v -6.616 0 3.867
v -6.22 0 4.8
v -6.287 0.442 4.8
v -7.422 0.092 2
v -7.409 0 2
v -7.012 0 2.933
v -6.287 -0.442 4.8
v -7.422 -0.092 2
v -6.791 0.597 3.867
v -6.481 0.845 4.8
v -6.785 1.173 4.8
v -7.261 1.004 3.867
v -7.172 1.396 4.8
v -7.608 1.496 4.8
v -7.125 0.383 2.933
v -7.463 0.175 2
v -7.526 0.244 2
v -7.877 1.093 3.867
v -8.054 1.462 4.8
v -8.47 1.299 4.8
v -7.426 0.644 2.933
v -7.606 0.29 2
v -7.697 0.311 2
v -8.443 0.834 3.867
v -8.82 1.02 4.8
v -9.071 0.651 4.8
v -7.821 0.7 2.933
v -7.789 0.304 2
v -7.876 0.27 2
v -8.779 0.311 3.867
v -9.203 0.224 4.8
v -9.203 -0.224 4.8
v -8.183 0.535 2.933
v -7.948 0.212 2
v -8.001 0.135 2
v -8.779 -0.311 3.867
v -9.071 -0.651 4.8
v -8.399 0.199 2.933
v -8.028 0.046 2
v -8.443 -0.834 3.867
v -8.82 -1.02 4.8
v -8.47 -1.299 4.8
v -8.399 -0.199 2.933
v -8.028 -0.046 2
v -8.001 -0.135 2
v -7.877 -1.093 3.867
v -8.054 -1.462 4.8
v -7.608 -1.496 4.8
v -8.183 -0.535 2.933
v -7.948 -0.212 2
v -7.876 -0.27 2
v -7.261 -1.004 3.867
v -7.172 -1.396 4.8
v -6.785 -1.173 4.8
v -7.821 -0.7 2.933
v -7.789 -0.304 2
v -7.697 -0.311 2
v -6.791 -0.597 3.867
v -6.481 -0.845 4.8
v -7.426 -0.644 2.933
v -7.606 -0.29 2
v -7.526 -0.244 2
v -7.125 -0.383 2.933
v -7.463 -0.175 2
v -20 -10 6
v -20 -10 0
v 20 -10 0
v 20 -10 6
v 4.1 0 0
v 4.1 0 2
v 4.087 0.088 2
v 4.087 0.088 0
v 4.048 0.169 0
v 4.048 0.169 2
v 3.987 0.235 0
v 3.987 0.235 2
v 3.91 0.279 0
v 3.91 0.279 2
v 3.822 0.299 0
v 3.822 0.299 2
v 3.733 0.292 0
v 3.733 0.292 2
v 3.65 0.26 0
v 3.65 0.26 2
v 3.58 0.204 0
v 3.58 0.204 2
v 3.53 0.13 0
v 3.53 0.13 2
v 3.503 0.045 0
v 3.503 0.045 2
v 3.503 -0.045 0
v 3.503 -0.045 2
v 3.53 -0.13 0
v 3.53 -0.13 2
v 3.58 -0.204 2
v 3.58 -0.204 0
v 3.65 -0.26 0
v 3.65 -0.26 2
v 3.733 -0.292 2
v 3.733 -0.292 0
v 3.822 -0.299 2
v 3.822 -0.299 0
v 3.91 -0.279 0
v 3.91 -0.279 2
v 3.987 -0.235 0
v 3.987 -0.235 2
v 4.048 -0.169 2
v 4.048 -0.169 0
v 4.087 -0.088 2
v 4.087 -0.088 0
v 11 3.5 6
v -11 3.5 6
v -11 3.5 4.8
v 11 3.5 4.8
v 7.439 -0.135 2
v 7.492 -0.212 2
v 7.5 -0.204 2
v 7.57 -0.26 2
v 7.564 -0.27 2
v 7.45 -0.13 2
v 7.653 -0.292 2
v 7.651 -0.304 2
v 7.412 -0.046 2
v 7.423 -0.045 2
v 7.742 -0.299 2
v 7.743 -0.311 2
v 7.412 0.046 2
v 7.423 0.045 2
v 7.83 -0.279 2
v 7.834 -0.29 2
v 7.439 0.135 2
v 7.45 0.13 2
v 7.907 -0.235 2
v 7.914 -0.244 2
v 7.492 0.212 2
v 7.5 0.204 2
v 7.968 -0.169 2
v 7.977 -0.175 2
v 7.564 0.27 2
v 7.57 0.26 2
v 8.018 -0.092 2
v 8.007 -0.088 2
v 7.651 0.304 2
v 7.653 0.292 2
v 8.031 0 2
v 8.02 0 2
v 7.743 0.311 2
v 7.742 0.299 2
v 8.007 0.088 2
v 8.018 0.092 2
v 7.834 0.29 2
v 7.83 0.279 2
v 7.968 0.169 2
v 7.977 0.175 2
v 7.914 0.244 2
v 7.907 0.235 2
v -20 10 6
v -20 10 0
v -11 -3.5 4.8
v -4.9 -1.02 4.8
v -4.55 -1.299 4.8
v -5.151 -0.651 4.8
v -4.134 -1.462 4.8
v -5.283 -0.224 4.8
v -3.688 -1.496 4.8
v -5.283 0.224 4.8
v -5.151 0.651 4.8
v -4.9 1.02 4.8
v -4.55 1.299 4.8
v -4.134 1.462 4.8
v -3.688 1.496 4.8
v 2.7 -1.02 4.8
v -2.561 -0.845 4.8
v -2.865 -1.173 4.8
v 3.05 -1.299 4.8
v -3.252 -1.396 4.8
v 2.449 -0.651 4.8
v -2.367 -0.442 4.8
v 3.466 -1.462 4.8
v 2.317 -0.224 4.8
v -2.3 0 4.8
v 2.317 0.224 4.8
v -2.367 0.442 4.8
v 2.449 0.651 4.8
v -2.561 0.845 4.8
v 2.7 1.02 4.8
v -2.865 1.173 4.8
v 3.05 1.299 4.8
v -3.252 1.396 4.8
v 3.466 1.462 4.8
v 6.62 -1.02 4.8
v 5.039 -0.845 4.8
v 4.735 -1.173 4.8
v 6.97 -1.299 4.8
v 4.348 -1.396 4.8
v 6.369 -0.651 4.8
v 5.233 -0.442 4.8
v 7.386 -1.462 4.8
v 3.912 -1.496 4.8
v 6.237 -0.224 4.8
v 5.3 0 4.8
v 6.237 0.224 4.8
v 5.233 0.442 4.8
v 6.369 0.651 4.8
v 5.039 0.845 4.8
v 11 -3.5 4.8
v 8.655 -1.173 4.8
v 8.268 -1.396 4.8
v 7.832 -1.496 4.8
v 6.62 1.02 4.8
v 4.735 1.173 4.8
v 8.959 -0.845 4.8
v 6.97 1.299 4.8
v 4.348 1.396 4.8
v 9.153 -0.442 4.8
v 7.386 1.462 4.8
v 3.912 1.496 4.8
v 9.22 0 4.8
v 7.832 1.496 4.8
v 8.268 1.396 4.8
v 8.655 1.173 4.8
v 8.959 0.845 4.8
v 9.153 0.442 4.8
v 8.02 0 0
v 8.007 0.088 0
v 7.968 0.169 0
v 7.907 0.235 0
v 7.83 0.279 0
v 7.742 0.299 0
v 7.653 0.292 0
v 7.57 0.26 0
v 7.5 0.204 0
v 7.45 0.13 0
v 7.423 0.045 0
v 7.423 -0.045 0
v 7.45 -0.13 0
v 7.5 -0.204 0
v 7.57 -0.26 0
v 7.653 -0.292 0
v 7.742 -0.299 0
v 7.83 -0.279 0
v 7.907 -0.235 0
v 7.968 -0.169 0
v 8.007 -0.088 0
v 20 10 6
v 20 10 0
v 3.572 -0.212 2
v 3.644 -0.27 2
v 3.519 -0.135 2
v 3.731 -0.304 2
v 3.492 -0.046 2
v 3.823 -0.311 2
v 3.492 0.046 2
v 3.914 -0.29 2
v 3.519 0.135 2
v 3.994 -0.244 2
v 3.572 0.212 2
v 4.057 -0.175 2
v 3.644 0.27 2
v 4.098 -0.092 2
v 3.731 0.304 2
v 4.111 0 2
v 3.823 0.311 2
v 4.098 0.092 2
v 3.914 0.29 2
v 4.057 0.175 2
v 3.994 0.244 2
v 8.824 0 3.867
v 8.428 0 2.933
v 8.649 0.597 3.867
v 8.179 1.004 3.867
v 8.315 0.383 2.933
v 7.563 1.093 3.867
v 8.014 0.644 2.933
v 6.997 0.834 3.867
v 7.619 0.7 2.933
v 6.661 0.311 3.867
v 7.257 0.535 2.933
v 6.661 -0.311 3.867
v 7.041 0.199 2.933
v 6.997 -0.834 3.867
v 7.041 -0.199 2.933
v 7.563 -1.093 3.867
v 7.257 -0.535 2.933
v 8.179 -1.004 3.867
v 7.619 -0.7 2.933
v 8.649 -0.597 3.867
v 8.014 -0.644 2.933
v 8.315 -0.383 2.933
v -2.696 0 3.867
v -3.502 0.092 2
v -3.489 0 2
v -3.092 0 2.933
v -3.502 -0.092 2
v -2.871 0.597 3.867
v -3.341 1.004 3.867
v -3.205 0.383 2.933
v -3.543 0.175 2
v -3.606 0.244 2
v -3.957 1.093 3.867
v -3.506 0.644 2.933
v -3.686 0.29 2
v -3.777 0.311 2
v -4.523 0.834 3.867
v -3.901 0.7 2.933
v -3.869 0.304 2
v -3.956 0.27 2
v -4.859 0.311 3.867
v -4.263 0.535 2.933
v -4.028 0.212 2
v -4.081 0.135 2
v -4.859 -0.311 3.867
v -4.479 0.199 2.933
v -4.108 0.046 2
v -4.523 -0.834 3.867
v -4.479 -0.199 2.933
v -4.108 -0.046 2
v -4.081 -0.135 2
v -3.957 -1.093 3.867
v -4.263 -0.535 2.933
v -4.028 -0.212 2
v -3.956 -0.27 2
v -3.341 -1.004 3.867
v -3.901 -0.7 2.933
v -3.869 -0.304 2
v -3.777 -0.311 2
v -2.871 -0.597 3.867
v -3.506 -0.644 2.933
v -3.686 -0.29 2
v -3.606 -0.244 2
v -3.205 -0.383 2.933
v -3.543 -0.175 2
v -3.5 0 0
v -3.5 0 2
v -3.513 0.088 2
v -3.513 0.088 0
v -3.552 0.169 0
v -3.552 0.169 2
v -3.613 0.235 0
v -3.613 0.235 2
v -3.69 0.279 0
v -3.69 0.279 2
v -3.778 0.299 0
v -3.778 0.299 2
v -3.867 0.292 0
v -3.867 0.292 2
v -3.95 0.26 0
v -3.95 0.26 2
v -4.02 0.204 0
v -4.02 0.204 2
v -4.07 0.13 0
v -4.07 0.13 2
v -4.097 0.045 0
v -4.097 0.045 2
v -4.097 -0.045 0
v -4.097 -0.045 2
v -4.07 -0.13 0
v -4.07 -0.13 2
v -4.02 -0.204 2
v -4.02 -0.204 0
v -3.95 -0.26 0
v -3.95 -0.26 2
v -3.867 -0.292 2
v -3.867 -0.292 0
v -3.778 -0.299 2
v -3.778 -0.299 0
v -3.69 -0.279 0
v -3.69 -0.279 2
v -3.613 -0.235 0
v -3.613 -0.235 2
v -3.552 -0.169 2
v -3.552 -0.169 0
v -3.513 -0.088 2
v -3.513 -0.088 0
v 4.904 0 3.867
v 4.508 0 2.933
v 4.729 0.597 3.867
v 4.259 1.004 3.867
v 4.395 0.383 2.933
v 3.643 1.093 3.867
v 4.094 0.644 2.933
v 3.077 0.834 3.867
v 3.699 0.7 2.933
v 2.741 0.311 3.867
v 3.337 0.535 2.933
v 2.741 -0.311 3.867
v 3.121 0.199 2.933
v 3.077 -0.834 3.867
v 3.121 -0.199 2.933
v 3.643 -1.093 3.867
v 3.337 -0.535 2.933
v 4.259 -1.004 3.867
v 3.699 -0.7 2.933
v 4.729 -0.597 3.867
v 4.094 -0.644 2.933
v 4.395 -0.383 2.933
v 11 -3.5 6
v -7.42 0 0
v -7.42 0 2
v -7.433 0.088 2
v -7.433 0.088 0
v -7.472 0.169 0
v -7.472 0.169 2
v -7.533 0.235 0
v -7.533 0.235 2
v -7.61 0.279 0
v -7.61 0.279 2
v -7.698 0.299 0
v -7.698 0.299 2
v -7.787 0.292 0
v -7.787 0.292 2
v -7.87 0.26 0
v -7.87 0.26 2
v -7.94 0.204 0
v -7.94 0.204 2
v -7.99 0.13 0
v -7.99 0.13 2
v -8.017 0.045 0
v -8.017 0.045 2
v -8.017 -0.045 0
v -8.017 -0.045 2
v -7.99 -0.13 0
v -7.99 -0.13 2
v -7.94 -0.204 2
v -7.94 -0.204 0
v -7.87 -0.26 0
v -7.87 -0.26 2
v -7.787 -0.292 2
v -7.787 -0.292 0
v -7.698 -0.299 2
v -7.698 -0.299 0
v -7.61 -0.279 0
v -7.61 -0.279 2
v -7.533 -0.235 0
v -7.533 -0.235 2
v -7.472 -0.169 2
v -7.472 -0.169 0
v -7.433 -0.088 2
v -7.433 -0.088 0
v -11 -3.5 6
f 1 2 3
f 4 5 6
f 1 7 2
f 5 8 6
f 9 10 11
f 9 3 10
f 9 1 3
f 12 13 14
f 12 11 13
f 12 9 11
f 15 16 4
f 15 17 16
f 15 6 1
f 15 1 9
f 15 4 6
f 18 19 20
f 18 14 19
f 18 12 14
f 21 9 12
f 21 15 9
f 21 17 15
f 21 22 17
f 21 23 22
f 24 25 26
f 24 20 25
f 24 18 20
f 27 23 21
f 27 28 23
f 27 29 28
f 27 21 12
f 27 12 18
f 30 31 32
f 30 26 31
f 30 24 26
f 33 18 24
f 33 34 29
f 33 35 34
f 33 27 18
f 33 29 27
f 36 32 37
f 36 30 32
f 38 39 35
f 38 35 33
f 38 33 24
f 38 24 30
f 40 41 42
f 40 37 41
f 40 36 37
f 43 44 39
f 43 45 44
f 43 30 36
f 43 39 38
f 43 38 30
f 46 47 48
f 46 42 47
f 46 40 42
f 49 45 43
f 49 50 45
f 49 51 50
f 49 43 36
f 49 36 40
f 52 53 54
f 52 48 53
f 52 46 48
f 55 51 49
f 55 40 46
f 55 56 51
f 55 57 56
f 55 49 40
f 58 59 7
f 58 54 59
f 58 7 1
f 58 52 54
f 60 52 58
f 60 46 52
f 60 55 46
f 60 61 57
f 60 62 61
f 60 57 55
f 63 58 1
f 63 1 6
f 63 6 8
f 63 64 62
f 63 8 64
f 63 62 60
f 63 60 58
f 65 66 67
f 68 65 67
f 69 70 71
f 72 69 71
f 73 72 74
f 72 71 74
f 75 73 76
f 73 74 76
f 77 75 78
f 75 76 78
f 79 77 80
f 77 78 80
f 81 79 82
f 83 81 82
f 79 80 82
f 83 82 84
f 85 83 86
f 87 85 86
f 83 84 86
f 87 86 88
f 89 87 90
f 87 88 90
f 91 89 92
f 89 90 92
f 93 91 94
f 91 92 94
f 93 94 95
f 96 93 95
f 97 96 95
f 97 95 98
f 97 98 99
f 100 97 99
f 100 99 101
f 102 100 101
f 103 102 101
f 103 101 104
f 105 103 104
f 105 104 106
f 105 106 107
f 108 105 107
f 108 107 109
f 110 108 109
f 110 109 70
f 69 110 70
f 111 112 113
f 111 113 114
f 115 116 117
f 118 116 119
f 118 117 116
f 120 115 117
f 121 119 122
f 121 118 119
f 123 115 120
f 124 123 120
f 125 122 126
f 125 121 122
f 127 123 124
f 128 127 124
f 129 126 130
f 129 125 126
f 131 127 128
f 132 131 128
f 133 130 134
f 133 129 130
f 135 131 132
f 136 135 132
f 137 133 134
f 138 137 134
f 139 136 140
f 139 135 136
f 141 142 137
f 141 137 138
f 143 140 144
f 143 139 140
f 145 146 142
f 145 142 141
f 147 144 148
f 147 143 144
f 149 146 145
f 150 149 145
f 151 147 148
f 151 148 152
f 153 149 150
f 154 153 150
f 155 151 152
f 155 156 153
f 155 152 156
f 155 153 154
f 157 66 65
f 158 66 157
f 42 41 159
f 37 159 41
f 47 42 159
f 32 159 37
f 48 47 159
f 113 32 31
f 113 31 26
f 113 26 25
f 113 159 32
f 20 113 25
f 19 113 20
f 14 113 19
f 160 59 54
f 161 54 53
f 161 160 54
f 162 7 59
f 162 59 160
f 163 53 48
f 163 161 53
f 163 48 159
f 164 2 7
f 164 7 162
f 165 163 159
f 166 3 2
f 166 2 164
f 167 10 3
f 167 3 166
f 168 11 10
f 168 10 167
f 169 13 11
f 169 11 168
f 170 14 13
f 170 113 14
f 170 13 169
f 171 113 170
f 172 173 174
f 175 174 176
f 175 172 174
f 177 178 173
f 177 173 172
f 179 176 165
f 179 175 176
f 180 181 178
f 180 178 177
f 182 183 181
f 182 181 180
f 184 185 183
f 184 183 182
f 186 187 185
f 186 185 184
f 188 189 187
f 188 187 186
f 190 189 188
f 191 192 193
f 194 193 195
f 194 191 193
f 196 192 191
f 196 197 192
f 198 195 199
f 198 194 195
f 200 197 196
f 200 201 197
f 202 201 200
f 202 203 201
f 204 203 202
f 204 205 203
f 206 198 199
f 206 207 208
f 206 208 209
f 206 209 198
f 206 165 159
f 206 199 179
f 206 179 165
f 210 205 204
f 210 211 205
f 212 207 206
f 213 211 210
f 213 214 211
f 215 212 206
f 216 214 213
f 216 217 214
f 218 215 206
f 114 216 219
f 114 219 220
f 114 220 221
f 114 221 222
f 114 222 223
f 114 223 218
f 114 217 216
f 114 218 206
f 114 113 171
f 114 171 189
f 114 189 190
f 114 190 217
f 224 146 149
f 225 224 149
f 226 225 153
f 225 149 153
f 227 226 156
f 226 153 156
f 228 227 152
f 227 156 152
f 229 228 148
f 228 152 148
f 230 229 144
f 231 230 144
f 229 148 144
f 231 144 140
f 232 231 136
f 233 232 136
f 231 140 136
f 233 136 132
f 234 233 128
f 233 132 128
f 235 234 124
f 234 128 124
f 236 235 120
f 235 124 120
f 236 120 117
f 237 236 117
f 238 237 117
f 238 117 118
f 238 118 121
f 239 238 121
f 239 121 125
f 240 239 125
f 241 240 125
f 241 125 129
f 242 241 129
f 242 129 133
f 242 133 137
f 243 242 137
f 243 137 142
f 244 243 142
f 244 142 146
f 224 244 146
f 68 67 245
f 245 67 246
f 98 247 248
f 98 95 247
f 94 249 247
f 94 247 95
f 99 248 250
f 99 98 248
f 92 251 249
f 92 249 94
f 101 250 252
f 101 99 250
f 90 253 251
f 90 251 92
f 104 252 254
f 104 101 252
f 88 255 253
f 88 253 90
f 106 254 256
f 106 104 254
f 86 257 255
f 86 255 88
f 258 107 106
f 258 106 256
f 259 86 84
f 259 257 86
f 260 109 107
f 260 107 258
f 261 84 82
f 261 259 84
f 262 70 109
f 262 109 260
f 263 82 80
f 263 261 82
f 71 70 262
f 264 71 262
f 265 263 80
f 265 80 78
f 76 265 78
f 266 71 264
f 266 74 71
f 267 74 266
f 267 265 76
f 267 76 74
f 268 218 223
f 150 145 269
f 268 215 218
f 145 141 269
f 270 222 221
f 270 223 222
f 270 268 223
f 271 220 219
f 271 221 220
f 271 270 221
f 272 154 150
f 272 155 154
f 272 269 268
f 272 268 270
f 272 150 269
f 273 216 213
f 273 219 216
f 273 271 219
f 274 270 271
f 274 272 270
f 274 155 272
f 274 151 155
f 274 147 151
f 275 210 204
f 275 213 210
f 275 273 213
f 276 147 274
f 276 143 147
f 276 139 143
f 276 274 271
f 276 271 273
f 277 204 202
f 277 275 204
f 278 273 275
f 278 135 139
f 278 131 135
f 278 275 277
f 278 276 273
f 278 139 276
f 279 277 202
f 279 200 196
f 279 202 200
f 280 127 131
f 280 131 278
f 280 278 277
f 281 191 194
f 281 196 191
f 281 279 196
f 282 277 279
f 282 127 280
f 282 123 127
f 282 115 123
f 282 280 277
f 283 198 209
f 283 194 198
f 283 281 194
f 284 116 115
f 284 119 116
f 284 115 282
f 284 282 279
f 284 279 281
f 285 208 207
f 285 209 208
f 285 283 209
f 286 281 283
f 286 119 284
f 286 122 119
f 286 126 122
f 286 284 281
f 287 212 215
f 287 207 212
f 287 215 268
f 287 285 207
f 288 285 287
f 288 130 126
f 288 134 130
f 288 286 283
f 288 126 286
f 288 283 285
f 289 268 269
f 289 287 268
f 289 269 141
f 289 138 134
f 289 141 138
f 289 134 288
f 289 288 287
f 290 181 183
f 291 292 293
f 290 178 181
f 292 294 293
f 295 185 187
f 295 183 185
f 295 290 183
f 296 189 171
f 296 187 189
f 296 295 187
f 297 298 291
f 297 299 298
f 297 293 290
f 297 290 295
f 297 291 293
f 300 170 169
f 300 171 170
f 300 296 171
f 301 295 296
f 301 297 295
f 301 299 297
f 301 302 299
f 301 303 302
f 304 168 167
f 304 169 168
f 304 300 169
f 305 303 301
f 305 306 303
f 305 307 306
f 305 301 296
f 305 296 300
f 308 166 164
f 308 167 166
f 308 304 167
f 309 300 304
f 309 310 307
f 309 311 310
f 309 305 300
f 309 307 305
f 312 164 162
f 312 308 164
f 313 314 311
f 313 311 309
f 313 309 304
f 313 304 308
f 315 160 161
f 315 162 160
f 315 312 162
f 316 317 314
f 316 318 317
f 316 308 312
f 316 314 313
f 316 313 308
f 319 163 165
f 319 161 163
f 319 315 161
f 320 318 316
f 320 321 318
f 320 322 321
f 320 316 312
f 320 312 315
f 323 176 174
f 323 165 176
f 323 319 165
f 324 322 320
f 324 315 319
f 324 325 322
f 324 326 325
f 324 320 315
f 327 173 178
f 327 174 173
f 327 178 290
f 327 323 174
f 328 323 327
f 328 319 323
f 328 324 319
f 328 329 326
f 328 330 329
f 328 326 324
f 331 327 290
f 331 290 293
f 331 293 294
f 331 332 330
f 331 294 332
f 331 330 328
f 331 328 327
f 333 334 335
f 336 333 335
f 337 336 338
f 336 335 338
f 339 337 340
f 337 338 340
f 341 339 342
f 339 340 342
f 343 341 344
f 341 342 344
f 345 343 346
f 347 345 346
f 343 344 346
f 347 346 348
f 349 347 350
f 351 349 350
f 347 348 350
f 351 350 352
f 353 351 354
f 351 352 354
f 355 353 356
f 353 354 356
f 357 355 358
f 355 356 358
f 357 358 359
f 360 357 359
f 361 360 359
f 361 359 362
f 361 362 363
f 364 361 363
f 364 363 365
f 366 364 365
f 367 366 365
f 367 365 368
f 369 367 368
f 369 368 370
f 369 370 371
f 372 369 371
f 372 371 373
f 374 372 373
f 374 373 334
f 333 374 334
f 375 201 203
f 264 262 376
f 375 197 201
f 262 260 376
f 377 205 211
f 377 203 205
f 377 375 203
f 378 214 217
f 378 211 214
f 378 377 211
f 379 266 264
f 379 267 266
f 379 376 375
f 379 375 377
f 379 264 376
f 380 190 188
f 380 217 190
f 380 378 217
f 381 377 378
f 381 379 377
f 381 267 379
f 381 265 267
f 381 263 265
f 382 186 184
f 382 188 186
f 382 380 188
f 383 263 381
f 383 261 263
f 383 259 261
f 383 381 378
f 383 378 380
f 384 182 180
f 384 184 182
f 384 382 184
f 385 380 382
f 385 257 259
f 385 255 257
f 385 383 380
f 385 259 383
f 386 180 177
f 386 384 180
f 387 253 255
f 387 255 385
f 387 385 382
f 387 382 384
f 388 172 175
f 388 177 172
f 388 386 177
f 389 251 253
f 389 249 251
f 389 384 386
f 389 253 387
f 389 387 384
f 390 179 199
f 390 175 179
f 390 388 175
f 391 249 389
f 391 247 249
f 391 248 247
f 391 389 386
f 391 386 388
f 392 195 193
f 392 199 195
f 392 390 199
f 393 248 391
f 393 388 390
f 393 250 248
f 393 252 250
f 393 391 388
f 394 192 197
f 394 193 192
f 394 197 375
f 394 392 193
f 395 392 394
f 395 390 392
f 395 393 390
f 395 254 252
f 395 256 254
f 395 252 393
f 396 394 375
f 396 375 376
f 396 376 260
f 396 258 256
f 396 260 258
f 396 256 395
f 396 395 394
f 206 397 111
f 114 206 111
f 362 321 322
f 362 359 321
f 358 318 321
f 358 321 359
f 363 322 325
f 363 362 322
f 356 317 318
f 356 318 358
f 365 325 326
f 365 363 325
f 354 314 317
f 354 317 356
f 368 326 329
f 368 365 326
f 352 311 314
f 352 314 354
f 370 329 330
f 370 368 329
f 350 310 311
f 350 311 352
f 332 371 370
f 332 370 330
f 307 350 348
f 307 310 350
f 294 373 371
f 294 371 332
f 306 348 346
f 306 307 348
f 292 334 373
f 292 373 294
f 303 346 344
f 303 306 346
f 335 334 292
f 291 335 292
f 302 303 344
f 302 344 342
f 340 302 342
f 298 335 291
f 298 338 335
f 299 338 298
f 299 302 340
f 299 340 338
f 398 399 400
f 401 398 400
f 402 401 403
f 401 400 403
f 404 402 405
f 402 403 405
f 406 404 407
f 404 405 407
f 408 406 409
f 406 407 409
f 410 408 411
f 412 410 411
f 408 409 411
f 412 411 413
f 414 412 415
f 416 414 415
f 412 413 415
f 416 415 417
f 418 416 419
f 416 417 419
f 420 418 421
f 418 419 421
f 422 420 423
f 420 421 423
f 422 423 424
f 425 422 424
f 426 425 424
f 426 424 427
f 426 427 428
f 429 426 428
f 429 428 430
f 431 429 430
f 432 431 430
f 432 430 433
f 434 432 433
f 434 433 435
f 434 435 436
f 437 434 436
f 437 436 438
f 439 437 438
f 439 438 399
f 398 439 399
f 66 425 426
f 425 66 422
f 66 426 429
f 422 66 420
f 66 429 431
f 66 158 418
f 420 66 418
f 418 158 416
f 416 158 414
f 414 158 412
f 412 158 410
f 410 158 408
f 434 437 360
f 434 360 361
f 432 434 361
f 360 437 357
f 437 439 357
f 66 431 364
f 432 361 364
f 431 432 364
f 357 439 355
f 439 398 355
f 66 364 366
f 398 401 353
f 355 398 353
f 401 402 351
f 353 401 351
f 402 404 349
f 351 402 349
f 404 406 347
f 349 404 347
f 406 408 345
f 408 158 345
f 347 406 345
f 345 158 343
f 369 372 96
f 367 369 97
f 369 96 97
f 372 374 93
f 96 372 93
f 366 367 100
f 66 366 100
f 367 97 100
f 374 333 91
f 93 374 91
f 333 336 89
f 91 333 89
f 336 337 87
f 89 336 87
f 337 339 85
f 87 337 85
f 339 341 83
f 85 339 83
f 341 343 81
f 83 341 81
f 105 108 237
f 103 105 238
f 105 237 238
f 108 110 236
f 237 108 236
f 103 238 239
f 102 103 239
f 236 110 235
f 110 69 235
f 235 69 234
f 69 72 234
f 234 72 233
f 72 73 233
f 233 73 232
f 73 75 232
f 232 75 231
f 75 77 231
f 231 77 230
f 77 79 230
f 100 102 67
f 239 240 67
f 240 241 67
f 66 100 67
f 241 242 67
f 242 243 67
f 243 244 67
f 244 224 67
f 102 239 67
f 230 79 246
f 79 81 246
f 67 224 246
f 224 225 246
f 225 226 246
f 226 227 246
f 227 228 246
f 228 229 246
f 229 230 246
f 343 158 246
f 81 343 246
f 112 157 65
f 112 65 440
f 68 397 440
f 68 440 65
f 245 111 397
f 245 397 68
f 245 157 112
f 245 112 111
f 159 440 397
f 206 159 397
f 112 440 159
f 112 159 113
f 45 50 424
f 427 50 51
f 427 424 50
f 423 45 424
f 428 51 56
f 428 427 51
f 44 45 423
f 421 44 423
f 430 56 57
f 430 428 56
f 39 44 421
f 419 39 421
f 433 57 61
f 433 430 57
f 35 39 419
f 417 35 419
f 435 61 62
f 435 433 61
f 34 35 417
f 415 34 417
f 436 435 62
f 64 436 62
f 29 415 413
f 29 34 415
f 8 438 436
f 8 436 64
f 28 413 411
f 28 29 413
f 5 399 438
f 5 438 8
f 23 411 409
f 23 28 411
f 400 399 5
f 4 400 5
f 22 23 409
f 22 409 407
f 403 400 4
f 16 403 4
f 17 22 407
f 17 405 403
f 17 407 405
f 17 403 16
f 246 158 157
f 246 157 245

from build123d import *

# Parameters (mm, degrees)
SKETCH1_W           = 40
SKETCH1_H           = 20
BOSS_EXTRUDE1_DEPTH = 6
SKETCH2_W           = 22
SKETCH2_H           = 7
CUT_EXTRUDE1_DEPTH  = 1.2
SKETCH4_R           = 1.5
CUT_EXTRUDE2_DEPTH  = 2.8
CUT_EXTRUDE2_TAPER  = 23
SKETCH5_R           = 0.3
CUT_EXTRUDE3_DEPTH  = 2.5


with BuildPart() as part:
    # Sketch1 → Boss-Extrude1 (new body)
    with BuildSketch(Plane.XY):
        Rectangle(SKETCH1_W, SKETCH1_H)
    extrude(amount=BOSS_EXTRUDE1_DEPTH)

    # Sketch2 → Cut-Extrude1 (cut)
    with BuildSketch(Plane.XY.offset(6)):
        Rectangle(SKETCH2_W, SKETCH2_H)
    extrude(amount=-CUT_EXTRUDE1_DEPTH, mode=Mode.SUBTRACT)

    # Sketch4 → Cut-Extrude2 (cut)
    with BuildSketch(Plane.XY.offset(4.8)):
        with Locations((-7.72, 0)):
            Circle(SKETCH4_R)
        with Locations((-3.8, 0)):
            Circle(SKETCH4_R)
        with Locations((3.8, 0)):
            Circle(SKETCH4_R)
        with Locations((7.72, 0)):
            Circle(SKETCH4_R)
    extrude(amount=-CUT_EXTRUDE2_DEPTH, taper=CUT_EXTRUDE2_TAPER, mode=Mode.SUBTRACT)

    # Sketch5 → Cut-Extrude3 (cut)
    with BuildSketch(Plane.XY.offset(2)):
        with Locations((-7.72, 0)):
            Circle(SKETCH5_R)
        with Locations((-3.8, 0)):
            Circle(SKETCH5_R)
        with Locations((3.8, 0)):
            Circle(SKETCH5_R)
        with Locations((7.72, 0)):
            Circle(SKETCH5_R)
    extrude(amount=-CUT_EXTRUDE3_DEPTH, mode=Mode.SUBTRACT)


solid = part.part
